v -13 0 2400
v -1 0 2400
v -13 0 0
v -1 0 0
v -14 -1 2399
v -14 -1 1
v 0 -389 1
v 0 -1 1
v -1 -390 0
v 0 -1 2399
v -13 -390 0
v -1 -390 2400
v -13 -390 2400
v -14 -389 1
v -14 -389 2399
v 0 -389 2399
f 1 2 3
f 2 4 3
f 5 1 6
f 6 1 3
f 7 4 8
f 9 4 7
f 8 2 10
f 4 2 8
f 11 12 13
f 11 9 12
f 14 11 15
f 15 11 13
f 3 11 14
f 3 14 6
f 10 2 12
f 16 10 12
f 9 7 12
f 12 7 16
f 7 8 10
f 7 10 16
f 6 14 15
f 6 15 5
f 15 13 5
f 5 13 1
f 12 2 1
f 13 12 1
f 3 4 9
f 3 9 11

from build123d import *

# Parameters (mm, degrees)
F0_W     = 55.4160475731
F0_H     = 42.9720431566
F1_DEPTH = 14
F2_DEPTH = 1060
F3_DEPTH = 390
F4_DEPTH = 1340
F5_SIZE  = 1


with BuildPart() as f1:
    # F0 (on Right) → F1 (new body)
    with BuildSketch(Plane.YZ):
        with Locations((-27.7080237865, 21.4860215783)):
            Rectangle(F0_W, F0_H)
    extrude(amount=-F1_DEPTH)

    # F2 (add): a face of the model
    f2_faces = [f1.faces().sort_by_distance(p)[0] for p in [
        (-7, -27.7080237865, 0),
    ]]
    extrude(f2_faces, amount=-F2_DEPTH)

    # F3 (add): a face of the model
    f3_faces = [f1.faces().sort_by_distance(p)[0] for p in [
        (-7, 0, 530),
    ]]
    extrude(f3_faces, amount=-F3_DEPTH)

    # F4 (add): a face of the model
    f4_faces = [f1.faces().sort_by_distance(p)[0] for p in [
        (-7, -195, 1060),
    ]]
    extrude(f4_faces, amount=F4_DEPTH)

    # F5
    f5_edges = [f1.edges().sort_by_distance(p)[0] for p in [
        (0, -195, 0),
        (0, 0, 1200),
        (0, -195, 2400),
        (0, -390, 1200),
        (-14, 0, 1200),
        (-14, -195, 2400),
        (-14, -390, 1200),
        (-14, -195, 0),
    ]]
    chamfer(f5_edges, length=F5_SIZE)


solid = f1.part
